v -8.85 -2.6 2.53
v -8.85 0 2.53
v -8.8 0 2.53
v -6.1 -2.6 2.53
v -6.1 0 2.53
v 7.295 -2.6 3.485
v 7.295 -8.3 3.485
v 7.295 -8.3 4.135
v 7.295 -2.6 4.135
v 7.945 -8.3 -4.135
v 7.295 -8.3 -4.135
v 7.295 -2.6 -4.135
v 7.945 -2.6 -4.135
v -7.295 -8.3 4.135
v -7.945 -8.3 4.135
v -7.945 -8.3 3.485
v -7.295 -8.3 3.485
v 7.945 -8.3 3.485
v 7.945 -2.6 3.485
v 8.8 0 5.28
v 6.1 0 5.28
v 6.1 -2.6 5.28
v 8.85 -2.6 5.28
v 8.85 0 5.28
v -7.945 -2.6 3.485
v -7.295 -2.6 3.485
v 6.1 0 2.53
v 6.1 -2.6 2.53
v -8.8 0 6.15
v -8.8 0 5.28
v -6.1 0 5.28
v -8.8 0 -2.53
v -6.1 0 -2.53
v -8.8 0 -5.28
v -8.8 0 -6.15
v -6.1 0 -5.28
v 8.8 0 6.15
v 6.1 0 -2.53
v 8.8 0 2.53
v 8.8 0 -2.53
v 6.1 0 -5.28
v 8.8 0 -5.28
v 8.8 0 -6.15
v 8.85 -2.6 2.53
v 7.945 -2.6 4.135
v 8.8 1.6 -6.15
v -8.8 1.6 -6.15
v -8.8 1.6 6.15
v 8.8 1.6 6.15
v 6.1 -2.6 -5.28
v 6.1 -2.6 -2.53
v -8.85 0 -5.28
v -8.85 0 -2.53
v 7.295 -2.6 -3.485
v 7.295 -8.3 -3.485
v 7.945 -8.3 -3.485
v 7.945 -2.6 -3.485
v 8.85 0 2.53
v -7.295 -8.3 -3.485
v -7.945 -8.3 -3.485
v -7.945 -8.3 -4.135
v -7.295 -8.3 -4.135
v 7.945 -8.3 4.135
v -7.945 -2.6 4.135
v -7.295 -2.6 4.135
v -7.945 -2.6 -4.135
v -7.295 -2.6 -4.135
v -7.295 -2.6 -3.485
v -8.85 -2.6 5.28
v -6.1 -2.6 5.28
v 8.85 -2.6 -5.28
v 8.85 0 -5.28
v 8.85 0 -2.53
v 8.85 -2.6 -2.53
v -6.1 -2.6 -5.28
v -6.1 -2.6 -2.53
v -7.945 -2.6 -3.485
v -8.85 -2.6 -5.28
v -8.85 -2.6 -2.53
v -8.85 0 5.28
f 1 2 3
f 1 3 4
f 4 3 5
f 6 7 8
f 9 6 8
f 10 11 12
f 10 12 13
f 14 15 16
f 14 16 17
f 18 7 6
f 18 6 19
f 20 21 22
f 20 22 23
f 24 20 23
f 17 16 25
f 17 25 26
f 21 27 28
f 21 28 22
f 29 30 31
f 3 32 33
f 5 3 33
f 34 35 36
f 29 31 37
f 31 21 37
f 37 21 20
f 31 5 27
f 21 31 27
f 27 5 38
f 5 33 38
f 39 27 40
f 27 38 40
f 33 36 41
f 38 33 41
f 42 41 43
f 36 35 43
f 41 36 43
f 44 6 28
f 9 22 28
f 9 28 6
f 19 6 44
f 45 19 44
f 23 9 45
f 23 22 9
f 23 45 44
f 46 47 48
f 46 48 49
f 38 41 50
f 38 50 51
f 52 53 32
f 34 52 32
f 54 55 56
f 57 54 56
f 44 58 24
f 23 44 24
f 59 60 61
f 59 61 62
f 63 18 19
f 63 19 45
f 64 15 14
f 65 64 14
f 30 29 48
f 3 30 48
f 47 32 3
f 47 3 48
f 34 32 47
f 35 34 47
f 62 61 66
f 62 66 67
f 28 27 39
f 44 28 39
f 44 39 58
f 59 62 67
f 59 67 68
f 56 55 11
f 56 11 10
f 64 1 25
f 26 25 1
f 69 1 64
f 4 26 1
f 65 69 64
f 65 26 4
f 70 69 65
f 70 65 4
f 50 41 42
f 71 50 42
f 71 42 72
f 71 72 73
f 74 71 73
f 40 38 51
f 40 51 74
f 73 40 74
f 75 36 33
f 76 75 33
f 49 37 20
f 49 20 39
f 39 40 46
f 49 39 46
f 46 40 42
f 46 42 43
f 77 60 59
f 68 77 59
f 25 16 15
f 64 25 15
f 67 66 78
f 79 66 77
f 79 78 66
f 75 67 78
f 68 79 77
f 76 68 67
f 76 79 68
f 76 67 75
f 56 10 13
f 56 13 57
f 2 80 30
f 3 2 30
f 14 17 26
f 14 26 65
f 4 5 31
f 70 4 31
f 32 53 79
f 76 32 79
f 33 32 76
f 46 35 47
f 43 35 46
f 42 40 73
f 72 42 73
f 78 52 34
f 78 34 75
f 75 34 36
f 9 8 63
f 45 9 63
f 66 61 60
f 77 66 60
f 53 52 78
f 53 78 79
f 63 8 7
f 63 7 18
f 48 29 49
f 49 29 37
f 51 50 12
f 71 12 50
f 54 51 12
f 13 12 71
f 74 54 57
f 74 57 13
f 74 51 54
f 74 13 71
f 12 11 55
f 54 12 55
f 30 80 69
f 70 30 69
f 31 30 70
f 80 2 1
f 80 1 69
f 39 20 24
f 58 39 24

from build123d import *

# Parameters (mm, degrees)
SKETCH1_W           = 17.6
SKETCH1_H           = 12.3
BOSS_EXTRUDE1_DEPTH = 1.6
SKETCH2_W           = 2.75
SKETCH2_H           = 2.75
BOSS_EXTRUDE2_DEPTH = 2.6
SKETCH3_W           = 0.65
SKETCH3_H           = 0.65
BOSS_EXTRUDE3_DEPTH = 5.7


with BuildPart() as part:
    # Sketch1 → Boss-Extrude1 (new body)
    with BuildSketch(Plane(origin=(0, 0, 0), x_dir=(1, 0, 0), z_dir=(0, 1, 0))):
        Rectangle(SKETCH1_W, SKETCH1_H)
    extrude(amount=BOSS_EXTRUDE1_DEPTH)

    # Sketch2 → Boss-Extrude2 (add)
    with BuildSketch(Plane.XZ):
        with Locations((-7.475, 3.905)):
            Rectangle(SKETCH2_W, SKETCH2_H)
        with Locations((-7.475, -3.905)):
            Rectangle(SKETCH2_W, SKETCH2_H)
        with Locations((7.475, -3.905)):
            Rectangle(SKETCH2_W, SKETCH2_H)
        with Locations((7.475, 3.905)):
            Rectangle(SKETCH2_W, SKETCH2_H)
    extrude(amount=BOSS_EXTRUDE2_DEPTH)

    # Sketch3 → Boss-Extrude3 (add)
    with BuildSketch(Plane.XZ.offset(2.6)):
        with Locations((7.62, -3.81)):
            Rectangle(SKETCH3_W, SKETCH3_H)
        with Locations((7.62, 3.81)):
            Rectangle(SKETCH3_W, SKETCH3_H)
        with Locations((-7.62, -3.81)):
            Rectangle(SKETCH3_W, SKETCH3_H)
        with Locations((-7.62, 3.81)):
            Rectangle(SKETCH3_W, SKETCH3_H)
    extrude(amount=BOSS_EXTRUDE3_DEPTH)


solid = part.part
